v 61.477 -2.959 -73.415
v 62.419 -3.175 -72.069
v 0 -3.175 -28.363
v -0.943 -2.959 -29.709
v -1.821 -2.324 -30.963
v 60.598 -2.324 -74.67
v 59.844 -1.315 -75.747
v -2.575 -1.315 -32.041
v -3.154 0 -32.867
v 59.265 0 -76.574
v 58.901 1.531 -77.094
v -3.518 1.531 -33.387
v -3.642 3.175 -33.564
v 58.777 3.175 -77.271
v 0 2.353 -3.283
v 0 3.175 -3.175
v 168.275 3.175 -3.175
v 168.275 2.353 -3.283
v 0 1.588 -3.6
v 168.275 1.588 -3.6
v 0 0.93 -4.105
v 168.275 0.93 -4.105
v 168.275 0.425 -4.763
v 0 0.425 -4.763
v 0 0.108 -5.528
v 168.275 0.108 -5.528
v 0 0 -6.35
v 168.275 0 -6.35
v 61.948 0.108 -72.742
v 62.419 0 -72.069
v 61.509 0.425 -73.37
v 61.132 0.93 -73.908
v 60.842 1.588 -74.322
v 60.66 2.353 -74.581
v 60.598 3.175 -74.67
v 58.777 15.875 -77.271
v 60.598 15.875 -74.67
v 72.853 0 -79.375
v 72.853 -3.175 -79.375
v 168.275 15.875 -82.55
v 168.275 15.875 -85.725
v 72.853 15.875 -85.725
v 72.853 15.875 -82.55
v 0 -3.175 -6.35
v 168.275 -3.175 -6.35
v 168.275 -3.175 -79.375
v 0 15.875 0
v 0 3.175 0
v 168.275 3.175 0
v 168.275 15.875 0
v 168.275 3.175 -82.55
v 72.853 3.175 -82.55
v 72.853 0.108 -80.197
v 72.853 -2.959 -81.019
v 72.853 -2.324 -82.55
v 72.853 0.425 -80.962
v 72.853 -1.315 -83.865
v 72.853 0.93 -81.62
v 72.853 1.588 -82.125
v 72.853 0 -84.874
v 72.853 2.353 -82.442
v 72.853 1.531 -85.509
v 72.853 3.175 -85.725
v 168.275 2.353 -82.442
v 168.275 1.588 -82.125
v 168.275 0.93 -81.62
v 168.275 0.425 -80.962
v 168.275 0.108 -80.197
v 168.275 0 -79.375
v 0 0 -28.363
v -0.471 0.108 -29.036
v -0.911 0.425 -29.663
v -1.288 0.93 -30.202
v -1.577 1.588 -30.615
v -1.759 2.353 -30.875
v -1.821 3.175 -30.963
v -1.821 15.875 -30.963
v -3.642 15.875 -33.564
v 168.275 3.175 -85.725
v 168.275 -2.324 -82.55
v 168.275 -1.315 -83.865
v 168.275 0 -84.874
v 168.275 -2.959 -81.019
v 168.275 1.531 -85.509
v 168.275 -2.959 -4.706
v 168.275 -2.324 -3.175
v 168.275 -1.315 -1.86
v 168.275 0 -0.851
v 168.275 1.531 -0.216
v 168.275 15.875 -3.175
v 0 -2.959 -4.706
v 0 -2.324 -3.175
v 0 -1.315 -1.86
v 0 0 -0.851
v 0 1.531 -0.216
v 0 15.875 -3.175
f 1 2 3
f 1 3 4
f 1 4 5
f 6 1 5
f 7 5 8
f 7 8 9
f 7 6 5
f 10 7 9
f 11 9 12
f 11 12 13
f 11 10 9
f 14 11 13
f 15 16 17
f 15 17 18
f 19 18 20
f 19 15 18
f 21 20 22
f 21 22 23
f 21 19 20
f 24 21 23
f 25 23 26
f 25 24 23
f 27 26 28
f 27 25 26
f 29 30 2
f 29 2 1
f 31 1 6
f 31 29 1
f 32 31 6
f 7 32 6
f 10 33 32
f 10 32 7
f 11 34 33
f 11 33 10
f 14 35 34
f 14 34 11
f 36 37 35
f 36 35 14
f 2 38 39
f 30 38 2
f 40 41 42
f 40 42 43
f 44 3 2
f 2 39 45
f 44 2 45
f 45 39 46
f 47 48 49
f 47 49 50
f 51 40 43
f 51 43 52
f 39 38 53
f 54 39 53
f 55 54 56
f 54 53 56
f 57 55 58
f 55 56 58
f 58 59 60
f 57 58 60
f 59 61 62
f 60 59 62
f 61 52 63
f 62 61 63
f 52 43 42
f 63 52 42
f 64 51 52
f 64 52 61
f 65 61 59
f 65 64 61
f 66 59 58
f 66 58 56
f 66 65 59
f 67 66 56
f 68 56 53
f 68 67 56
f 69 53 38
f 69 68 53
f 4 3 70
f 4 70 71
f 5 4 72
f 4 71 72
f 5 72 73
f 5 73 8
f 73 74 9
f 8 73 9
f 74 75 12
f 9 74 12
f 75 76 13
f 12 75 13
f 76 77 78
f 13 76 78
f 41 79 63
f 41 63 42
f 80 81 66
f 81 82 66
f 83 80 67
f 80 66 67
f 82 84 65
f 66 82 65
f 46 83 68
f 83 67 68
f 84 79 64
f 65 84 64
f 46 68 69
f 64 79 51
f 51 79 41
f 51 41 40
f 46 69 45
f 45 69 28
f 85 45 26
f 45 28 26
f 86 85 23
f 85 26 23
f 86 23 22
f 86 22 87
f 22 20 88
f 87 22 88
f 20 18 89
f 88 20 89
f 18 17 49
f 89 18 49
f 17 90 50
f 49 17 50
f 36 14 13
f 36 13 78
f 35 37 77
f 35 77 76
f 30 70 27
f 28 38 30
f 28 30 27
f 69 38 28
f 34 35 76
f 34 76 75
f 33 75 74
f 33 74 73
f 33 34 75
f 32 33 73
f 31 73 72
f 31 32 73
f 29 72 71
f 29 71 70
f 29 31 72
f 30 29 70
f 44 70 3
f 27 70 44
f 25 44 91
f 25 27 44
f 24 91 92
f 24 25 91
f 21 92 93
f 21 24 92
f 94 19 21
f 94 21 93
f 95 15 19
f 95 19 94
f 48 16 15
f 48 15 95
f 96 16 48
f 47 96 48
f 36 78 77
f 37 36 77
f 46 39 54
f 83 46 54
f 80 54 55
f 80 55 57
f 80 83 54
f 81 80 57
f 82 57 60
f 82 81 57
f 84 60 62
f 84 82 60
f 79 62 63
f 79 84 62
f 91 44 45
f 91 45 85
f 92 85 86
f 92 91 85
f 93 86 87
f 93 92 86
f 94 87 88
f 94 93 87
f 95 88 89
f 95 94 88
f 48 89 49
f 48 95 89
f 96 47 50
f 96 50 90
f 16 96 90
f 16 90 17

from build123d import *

# Parameters (mm, degrees)
BASE_FLANGE1_DEPTH        = 3.175
EDGE_FLANGE1_DEPTH        = 95.421779032
EDGE_FLANGE1_BEND_DEPTH   = 168.275
EDGE_FLANGE1_BEND_2_DEPTH = 76.2


# Sheet-metal steps are written as plain solids
with BuildPart() as part:
    # Sketch1 → Base-Flange1 (new body)
    with BuildSketch(Plane(origin=(0, 0, 0), x_dir=(1, 0, 0), z_dir=(0, 1, 0))):
        Polygon((168.275, 79.375), (72.853220968, 79.375), (0, 28.362625496), (0, 6.35), (168.275, 6.35), align=None)
    extrude(amount=-BASE_FLANGE1_DEPTH)

    # Edge-Flange1 section (across the edge) → Edge-Flange1 (add)
    with BuildSketch(Plane(origin=(168.275, 0, -82.55), x_dir=(0, 0, 1), z_dir=(-1, 0, 0))):
        with BuildLine():
            Line((-3.175, 3.175), (-3.175, 15.875))
            Line((-3.175, 15.875), (0, 15.875))
            Line((0, 15.875), (0, 3.175))
            ThreePointArc((0, 3.175), (0.92993597, 0.92993597), (3.175, 0))
            Line((3.175, 0), (3.175, -3.175))
            ThreePointArc((3.175, -3.175), (-1.315128061, -1.315128061), (-3.175, 3.175))
        make_face()
    extrude(amount=EDGE_FLANGE1_DEPTH)

    # Edge-Flange1 section 2 (across the edge) → Edge-Flange1 bend (add)
    with BuildSketch(Plane(origin=(0, 0, -3.175), x_dir=(0, 0, -1), z_dir=(1, 0, 0))):
        with BuildLine():
            Line((-3.175, 3.175), (-3.175, 15.875))
            Line((-3.175, 15.875), (0, 15.875))
            Line((0, 15.875), (0, 3.175))
            ThreePointArc((0, 3.175), (0.92993597, 0.92993597), (3.175, 0))
            Line((3.175, 0), (3.175, -3.175))
            ThreePointArc((3.175, -3.175), (-1.315128061, -1.315128061), (-3.175, 3.175))
        make_face()
    extrude(amount=EDGE_FLANGE1_BEND_DEPTH)

    # Edge-Flange1 section 3 (across the edge) → Edge-Flange1 bend 2 (add)
    with BuildSketch(Plane(origin=(60.598280589, 0, -74.669957686), x_dir=(0.5735764363510473, 3.491481338843133e-15, 0.819152044288991), z_dir=(-0.819152044288991, 0, 0.5735764363510473))):
        with BuildLine():
            Line((-3.175, 3.175), (-3.175, 15.875))
            Line((-3.175, 15.875), (0, 15.875))
            Line((0, 15.875), (0, 3.175))
            ThreePointArc((0, 3.175), (0.92993597, 0.92993597), (3.175, 0))
            Line((3.175, 0), (3.175, -3.175))
            ThreePointArc((3.175, -3.175), (-1.315128061, -1.315128061), (-3.175, 3.175))
        make_face()
    extrude(amount=EDGE_FLANGE1_BEND_2_DEPTH)


solid = part.part
